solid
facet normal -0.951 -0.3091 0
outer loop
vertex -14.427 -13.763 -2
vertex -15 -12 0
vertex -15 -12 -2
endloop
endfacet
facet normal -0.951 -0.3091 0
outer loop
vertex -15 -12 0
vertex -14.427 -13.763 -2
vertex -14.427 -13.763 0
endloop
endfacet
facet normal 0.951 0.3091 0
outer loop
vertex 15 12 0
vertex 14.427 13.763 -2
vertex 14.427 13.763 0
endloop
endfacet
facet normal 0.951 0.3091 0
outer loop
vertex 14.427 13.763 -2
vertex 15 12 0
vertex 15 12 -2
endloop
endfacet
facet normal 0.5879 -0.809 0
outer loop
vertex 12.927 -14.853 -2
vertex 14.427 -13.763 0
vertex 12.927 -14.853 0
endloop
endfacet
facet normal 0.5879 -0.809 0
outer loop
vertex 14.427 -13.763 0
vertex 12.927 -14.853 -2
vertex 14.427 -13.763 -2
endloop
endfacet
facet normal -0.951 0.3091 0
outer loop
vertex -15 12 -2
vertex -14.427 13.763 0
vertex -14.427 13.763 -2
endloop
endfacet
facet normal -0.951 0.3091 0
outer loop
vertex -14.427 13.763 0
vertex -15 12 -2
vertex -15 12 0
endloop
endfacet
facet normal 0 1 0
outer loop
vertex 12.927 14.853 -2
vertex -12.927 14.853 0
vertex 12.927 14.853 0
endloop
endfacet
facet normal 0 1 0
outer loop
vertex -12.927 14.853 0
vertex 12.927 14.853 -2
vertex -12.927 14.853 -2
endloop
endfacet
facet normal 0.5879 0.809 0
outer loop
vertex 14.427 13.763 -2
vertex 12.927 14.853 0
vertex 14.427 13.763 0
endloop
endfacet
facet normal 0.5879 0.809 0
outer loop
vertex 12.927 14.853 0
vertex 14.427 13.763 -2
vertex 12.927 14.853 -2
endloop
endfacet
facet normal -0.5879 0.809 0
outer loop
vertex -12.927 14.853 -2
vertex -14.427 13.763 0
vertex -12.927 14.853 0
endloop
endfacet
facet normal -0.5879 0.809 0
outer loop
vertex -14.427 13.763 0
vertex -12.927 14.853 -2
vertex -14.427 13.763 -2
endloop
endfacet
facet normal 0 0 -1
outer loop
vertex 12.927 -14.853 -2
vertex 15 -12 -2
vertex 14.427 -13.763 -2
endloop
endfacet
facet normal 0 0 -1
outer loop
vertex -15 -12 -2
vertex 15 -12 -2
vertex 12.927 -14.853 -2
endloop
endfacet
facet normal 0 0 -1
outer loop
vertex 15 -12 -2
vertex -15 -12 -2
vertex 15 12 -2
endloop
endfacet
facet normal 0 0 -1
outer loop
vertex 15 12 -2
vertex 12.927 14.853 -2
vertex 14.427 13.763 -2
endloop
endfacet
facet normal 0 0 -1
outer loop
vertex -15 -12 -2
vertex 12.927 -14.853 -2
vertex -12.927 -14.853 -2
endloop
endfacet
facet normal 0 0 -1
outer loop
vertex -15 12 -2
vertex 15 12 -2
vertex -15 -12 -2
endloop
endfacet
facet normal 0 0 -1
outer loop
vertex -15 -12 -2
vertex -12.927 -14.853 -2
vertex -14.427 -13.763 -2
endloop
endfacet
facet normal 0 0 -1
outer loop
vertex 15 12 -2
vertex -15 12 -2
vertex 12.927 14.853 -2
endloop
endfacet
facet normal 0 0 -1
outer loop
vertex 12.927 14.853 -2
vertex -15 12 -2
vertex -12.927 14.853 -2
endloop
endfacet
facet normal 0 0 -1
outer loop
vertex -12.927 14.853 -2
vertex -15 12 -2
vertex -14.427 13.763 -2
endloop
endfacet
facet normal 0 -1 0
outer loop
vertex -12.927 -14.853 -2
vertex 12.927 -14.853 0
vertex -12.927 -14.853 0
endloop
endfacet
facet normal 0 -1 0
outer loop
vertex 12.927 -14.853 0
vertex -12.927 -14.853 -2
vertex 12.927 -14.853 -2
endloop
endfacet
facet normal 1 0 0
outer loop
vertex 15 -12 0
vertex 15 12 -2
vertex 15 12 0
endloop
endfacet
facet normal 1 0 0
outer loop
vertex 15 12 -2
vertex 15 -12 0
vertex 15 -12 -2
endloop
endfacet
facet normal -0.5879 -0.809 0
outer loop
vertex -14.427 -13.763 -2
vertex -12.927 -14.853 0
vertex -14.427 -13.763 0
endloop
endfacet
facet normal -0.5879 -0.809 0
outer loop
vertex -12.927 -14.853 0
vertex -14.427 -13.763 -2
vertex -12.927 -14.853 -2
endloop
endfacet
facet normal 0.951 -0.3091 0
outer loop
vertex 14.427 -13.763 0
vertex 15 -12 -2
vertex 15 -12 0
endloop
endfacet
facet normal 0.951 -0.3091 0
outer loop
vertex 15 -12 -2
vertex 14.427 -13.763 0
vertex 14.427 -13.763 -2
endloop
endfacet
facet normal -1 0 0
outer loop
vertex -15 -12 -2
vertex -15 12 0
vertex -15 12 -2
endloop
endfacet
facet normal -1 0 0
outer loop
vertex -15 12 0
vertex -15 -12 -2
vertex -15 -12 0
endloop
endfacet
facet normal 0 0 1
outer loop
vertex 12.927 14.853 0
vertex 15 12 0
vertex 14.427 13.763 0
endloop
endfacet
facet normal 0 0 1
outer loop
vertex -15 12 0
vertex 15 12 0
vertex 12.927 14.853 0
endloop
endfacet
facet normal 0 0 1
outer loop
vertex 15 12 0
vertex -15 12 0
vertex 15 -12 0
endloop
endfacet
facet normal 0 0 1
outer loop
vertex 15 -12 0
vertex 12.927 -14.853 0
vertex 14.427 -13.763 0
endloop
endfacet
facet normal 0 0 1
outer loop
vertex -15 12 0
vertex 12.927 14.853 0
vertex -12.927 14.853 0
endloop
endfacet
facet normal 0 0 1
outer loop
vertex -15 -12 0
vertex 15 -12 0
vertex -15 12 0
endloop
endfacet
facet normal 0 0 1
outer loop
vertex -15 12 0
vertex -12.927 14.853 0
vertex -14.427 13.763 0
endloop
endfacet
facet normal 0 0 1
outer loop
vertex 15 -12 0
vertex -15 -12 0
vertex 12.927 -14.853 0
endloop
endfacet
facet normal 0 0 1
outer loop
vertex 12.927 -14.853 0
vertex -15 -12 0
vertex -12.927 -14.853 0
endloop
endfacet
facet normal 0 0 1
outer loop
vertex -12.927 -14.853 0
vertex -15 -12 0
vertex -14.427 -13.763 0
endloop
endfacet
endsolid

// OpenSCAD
circuitBoard(30, 30, 2, 10, 5, 2.54);

module circuitBoardPinHoles(pins, rows, step, depth)
{
    centerX = pins*step/2;
    centerY = rows*step/2;
    for(x=[0:pins-1],y=[0:rows-1])
        translate([x*step-centerX,y*step-centerY,depth-0.1])
            //cube([0.6,0.6,11.5]);
            cylinder(r=0.3, h=depth+0.2);
}

module circuitBoard(width,height,depth,pinsWidth,pinsHeight,pinsStep)
{
  color("limegreen") difference()
  {
    hull()
    {
      translate([-(width-6)/2,-(height-6)/2,-depth]) cylinder(r=3, h=depth );
      translate([-(width-6)/2, (height-6)/2,-depth]) cylinder(r=3, h=depth );
      translate([ (width-6)/2,-(height-6)/2,-depth]) cylinder(r=3, h=depth );
      translate([ (width-6)/2, (height-6)/2,-depth]) cylinder(r=3, h=depth );
    }
    circuitBoardPinHoles(10, 10, 2.54, depth);  

  }
}
